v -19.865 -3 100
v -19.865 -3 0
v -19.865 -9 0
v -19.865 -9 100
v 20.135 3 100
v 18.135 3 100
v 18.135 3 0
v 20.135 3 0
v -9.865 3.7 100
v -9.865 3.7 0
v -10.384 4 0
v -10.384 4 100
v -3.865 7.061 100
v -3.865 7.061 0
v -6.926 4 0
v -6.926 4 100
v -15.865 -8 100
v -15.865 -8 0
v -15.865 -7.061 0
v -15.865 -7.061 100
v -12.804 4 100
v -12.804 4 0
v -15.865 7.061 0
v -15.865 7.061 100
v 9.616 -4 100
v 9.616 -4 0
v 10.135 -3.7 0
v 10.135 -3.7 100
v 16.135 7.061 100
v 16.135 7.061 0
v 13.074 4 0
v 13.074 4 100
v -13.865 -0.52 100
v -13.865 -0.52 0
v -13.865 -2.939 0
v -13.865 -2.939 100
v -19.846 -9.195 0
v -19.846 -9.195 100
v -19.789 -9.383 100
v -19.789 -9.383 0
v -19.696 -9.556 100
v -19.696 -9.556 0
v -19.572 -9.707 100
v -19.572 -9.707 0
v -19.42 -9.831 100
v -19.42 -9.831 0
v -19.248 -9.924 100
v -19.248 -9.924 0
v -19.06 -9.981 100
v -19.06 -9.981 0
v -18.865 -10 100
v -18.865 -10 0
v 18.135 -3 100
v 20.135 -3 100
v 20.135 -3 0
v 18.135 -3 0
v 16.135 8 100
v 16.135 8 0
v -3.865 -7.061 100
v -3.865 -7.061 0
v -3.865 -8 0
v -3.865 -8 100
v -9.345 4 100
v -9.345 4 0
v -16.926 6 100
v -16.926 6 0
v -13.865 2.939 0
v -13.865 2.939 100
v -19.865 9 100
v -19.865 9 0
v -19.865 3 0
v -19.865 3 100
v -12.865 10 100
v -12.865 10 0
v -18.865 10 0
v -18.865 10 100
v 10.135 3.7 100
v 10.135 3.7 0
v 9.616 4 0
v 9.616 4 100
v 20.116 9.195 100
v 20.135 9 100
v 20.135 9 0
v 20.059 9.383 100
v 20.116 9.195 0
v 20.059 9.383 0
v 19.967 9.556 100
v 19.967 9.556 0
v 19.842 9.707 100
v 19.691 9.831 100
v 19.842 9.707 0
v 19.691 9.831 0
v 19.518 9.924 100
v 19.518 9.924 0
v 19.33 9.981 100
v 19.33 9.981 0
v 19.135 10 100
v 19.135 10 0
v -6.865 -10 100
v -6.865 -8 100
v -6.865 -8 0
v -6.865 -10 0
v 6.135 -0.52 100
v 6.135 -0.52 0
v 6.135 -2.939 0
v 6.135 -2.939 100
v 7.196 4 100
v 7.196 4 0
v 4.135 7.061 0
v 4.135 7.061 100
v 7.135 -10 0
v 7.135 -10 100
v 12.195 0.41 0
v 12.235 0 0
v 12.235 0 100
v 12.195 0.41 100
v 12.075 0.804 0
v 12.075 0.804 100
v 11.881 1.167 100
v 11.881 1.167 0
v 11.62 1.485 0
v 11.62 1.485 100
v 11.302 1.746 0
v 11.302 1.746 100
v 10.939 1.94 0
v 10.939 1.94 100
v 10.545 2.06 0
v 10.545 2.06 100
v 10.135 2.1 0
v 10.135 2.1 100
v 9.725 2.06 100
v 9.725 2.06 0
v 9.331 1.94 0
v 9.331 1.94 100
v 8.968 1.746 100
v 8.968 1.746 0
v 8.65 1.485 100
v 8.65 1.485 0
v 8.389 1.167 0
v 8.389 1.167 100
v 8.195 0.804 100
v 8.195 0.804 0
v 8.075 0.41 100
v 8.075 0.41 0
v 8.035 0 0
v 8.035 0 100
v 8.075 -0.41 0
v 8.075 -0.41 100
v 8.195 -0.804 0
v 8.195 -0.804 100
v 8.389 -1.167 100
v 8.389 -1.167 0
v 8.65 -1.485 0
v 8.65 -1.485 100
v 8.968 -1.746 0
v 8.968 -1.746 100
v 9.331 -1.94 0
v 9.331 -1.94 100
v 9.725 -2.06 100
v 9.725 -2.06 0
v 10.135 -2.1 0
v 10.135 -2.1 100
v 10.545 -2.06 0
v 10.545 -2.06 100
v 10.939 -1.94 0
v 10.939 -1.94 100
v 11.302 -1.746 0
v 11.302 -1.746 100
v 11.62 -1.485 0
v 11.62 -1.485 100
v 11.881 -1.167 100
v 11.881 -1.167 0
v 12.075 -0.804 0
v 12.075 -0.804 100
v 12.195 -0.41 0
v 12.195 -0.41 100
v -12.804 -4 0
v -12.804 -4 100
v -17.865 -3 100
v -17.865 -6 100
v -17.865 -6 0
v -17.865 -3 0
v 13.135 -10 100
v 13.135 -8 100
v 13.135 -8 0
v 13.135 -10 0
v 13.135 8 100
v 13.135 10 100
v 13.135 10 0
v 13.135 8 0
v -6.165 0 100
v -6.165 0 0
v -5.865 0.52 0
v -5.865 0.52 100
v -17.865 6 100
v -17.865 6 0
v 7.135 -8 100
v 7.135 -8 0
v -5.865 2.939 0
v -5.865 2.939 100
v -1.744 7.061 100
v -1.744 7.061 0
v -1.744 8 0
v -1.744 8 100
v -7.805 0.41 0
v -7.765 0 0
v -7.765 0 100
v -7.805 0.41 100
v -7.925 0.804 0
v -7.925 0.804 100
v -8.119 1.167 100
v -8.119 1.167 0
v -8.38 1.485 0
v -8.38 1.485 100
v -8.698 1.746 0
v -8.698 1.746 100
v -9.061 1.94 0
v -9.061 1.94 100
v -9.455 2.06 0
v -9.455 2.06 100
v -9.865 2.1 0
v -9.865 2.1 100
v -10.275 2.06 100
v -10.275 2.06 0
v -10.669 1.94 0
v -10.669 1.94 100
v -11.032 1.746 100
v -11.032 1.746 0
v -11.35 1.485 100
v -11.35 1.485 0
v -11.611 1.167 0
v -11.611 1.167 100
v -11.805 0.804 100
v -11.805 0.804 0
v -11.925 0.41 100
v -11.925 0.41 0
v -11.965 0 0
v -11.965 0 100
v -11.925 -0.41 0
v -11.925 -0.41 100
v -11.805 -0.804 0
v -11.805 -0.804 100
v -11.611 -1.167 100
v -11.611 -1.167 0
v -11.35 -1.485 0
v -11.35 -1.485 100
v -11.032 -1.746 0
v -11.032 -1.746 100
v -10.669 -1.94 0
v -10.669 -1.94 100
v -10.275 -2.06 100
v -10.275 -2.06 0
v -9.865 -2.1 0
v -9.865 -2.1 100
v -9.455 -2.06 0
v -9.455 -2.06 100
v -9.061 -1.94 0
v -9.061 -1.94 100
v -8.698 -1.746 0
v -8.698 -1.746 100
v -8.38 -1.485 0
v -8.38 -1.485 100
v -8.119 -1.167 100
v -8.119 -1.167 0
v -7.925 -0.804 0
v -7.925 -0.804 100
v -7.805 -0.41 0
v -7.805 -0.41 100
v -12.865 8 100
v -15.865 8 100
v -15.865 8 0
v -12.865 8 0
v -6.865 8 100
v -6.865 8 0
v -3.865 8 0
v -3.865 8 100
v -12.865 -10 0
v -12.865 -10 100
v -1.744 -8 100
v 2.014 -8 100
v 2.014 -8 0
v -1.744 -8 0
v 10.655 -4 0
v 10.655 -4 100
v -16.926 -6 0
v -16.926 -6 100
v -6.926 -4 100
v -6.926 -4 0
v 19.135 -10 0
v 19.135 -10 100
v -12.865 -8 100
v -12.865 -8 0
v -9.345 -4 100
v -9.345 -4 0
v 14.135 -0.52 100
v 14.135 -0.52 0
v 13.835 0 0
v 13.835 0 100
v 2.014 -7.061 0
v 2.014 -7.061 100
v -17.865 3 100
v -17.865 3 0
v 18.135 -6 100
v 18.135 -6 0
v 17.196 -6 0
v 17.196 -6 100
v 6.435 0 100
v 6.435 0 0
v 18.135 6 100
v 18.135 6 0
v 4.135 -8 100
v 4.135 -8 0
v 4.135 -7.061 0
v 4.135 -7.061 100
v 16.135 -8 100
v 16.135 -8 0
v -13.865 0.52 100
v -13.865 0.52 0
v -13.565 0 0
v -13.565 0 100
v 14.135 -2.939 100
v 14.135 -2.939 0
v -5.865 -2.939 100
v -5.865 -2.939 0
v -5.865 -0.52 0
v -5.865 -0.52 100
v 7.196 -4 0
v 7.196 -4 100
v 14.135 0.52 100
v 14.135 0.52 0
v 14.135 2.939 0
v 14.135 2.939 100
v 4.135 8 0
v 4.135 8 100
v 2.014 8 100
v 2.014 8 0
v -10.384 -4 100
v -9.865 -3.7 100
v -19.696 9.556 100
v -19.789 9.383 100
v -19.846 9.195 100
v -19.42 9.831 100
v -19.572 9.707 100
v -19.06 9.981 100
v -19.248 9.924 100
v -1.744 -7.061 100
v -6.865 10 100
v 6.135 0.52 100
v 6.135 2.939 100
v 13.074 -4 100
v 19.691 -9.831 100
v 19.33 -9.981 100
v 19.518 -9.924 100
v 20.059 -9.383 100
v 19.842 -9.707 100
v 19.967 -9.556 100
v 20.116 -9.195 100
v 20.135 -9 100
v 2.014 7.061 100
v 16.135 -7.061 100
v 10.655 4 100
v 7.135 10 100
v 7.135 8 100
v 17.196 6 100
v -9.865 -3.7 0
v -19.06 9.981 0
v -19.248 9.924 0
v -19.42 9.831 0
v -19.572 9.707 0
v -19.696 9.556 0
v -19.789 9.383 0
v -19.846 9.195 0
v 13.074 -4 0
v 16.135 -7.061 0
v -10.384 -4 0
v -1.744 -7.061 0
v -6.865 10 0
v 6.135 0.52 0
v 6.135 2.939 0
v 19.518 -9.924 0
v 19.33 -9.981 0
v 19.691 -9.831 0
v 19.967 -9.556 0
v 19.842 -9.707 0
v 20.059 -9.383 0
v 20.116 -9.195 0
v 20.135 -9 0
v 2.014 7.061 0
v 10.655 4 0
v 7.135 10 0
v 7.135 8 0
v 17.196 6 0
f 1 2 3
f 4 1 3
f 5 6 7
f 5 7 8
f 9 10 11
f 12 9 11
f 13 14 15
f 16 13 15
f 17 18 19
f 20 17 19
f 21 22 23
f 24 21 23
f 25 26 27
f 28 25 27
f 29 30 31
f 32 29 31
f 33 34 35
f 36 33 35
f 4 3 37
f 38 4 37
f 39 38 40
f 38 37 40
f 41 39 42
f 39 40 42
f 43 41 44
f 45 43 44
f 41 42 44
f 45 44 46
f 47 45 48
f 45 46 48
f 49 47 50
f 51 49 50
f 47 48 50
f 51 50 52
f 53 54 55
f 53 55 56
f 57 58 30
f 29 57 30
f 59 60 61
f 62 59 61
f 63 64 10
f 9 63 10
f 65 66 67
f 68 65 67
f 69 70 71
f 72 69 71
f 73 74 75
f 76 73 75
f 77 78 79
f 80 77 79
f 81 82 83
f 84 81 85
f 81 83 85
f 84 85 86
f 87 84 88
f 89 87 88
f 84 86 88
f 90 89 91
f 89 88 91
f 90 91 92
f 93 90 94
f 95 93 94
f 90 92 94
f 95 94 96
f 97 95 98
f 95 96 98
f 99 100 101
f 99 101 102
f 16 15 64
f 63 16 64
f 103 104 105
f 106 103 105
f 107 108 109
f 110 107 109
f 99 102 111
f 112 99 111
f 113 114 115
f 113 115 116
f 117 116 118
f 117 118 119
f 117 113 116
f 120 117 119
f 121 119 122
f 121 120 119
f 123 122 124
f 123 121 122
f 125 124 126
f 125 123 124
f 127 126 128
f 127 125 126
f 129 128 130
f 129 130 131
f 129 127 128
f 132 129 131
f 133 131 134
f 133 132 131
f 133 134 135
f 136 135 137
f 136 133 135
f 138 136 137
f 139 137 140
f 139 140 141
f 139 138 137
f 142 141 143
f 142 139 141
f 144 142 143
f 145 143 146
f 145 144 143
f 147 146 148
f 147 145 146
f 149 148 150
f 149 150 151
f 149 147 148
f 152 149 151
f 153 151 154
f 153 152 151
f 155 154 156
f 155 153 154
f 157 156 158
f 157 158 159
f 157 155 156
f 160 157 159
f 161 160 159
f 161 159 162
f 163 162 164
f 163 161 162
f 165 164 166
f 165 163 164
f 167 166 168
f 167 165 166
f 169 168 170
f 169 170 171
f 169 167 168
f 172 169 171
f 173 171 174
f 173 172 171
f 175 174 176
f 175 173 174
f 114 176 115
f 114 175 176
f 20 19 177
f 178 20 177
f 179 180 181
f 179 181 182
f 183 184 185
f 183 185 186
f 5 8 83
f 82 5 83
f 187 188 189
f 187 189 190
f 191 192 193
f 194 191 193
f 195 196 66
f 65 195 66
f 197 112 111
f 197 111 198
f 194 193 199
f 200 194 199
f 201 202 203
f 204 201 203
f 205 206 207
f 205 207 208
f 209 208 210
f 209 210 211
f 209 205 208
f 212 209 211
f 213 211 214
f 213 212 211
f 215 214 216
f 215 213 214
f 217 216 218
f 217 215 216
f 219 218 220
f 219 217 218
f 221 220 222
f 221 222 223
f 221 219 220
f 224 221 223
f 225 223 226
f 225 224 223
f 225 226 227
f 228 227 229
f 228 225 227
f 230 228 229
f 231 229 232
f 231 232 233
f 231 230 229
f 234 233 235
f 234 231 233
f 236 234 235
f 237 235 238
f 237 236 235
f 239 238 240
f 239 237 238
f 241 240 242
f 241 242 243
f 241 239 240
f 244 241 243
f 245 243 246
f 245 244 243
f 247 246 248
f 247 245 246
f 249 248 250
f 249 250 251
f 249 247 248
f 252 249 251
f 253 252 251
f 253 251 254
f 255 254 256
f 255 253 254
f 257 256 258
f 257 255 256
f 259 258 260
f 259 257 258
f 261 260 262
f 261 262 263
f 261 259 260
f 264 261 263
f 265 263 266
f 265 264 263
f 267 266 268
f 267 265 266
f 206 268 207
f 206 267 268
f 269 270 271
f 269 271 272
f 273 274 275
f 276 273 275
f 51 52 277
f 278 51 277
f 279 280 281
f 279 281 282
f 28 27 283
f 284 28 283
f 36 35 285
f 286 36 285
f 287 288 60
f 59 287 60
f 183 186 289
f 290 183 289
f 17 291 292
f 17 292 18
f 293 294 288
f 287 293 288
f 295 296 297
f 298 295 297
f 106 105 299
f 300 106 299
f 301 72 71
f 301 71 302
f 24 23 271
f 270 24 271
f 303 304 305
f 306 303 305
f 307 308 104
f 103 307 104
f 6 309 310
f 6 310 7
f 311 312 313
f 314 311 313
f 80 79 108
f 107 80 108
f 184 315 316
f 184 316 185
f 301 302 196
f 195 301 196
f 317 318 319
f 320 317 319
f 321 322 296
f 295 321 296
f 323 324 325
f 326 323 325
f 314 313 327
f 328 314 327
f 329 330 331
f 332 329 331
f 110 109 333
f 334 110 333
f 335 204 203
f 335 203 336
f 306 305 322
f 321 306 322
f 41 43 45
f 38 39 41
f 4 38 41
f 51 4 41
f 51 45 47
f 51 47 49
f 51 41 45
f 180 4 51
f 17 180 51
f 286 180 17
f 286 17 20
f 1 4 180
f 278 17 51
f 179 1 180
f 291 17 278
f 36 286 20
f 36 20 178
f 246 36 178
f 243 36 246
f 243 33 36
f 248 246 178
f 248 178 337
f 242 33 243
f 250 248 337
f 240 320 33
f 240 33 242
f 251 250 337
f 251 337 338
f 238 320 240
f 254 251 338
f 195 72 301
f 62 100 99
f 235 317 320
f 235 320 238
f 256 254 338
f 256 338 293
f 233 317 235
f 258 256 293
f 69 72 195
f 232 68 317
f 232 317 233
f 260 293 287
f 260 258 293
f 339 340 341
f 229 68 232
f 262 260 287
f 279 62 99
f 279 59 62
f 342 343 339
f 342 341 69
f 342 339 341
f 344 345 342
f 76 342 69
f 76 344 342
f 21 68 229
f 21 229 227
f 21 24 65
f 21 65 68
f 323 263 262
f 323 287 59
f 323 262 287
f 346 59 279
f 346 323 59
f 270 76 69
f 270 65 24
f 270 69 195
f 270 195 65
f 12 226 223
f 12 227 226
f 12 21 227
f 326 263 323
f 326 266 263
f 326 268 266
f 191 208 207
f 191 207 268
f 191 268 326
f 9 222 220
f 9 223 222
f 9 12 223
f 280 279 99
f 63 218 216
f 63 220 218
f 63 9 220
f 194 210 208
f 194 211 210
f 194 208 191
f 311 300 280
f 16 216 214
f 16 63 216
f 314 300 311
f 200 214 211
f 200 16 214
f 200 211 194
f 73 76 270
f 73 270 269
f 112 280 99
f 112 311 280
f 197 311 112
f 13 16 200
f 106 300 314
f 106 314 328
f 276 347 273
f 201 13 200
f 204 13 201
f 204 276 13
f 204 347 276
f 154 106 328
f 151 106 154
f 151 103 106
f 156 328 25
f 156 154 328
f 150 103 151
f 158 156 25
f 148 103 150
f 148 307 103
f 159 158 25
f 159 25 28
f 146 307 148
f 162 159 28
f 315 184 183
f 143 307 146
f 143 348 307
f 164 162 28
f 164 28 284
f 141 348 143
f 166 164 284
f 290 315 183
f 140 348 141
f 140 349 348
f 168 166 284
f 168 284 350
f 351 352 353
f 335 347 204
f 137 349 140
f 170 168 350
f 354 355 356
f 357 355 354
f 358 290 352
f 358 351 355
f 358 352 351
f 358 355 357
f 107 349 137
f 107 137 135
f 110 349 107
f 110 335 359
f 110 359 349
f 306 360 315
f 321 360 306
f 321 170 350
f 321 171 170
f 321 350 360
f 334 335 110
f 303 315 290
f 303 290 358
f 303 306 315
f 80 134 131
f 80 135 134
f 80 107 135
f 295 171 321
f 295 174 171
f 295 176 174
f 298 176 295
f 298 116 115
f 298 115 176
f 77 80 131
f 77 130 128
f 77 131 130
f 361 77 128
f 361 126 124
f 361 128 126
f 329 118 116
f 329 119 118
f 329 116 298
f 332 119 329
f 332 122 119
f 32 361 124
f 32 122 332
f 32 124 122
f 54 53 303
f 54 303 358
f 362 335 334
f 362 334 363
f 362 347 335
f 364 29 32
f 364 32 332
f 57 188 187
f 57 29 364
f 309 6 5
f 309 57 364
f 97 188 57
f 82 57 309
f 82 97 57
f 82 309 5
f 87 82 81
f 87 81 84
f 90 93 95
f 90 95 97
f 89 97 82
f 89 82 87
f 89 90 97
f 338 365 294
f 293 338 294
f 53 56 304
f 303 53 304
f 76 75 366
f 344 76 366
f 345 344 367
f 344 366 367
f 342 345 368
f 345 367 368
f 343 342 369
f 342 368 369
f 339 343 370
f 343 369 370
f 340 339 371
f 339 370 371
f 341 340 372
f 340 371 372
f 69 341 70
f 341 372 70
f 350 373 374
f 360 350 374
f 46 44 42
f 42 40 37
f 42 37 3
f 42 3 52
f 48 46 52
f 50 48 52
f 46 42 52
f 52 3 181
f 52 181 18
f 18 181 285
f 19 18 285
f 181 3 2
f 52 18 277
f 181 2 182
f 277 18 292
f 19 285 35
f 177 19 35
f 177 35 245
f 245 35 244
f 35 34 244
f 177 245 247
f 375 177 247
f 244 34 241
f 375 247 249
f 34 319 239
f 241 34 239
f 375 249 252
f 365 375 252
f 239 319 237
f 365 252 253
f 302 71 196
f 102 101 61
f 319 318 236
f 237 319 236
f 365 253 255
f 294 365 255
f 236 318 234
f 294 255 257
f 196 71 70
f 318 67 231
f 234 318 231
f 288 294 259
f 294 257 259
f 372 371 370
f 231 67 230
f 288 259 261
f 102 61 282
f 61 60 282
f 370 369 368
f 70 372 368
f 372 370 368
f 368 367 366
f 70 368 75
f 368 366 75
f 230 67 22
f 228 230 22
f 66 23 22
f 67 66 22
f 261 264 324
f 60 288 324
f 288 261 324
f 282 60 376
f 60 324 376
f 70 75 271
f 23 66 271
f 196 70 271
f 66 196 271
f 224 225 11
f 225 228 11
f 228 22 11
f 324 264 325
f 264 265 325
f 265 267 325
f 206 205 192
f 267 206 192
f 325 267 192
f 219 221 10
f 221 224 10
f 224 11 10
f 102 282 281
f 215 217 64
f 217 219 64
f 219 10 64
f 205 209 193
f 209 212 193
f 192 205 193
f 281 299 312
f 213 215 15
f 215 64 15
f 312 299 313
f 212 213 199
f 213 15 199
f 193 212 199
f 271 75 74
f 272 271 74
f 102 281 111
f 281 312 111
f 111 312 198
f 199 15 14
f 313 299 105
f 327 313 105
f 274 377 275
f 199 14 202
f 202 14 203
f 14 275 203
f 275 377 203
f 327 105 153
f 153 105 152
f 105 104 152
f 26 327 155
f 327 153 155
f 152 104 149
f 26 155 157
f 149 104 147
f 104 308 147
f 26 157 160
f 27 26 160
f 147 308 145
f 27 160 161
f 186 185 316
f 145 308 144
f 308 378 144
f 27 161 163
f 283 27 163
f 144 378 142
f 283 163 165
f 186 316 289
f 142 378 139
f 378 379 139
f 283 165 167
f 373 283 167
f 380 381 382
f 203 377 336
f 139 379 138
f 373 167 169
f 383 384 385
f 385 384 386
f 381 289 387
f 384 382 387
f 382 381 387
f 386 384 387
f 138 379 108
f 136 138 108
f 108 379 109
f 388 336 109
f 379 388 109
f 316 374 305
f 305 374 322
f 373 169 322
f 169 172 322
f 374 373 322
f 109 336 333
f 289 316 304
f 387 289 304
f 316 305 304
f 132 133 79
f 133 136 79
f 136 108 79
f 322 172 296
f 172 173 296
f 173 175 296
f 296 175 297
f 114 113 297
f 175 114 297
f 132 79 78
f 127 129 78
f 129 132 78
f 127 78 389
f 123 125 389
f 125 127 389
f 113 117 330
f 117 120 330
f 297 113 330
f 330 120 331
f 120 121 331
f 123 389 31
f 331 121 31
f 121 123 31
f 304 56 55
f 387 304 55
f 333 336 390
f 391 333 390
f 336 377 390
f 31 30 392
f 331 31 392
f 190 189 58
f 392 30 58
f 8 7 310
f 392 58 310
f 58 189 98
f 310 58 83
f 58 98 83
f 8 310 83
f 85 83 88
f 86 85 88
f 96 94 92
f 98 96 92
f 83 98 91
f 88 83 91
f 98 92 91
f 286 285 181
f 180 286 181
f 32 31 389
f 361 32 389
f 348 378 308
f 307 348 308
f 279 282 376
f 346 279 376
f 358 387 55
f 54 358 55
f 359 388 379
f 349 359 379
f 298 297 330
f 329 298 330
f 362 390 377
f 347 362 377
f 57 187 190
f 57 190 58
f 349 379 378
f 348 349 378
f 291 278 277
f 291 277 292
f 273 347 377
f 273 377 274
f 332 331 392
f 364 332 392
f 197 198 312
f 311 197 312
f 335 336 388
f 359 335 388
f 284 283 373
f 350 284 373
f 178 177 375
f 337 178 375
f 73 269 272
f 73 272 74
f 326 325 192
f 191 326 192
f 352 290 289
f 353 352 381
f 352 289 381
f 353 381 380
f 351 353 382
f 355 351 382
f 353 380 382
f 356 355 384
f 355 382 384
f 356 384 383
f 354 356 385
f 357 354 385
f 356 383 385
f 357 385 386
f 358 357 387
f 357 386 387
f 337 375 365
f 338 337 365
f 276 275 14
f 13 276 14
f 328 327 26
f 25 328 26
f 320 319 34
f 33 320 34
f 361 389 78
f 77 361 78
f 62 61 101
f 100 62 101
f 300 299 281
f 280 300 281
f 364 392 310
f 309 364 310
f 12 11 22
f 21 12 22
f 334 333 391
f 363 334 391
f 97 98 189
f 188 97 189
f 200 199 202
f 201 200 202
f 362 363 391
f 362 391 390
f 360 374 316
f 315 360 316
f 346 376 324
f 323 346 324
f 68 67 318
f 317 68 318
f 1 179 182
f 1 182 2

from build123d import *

# Parameters (mm, degrees)
F0_R     = 2.1
F1_DEPTH = 100


with BuildPart() as f1:
    # F0 (on Top) → F1 (new body)
    with BuildSketch(Plane.XY):
        with BuildLine():
            Line((14.135135, -0.519615), (13.835135, 0))
            Line((13.835135, 0), (14.135135, 0.519615))
            Line((14.135135, 0.519615), (14.135135, 2.93934))
            Line((14.135135, 2.93934), (17.195795, 6))
            Line((17.195795, 6), (18.135135, 6))
            Line((18.135135, 6), (18.135135, 3))
            Line((18.135135, 3), (20.135135, 3))
            Line((20.135135, 3), (20.135135, 9))
            ThreePointArc((20.135135, 9), (19.842242, 9.707107), (19.135135, 10))
            Line((19.135135, 10), (13.135135, 10))
            Line((13.135135, 10), (13.135135, 8))
            Line((13.135135, 8), (16.135135, 8))
            Line((16.135135, 8), (16.135135, 7.06066))
            Line((16.135135, 7.06066), (13.074475, 4))
            Line((13.074475, 4), (10.65475, 4))
            Line((10.65475, 4), (10.135135, 3.7))
            Line((10.135135, 3.7), (9.61552, 4))
            Line((9.61552, 4), (7.195795, 4))
            Line((7.195795, 4), (4.135135, 7.06066))
            Line((4.135135, 7.06066), (4.135135, 8))
            Line((4.135135, 8), (7.135135, 8))
            Line((7.135135, 8), (7.135135, 10))
            Line((7.135135, 10), (-6.864865, 10))
            Line((-6.864865, 10), (-6.864865, 8))
            Line((-6.864865, 8), (-3.864865, 8))
            Line((-3.864865, 8), (-3.864865, 7.06066))
            Line((-3.864865, 7.06066), (-6.925525, 4))
            Line((-6.925525, 4), (-9.34525, 4))
            Line((-9.34525, 4), (-9.864865, 3.7))
            Line((-9.864865, 3.7), (-10.38448, 4))
            Line((-10.38448, 4), (-12.804205, 4))
            Line((-12.804205, 4), (-15.864865, 7.06066))
            Line((-15.864865, 7.06066), (-15.864865, 8))
            Line((-15.864865, 8), (-12.864865, 8))
            Line((-12.864865, 8), (-12.864865, 10))
            Line((-12.864865, 10), (-18.864865, 10))
            ThreePointArc((-18.864865, 10), (-19.571972, 9.707107), (-19.864865, 9))
            Line((-19.864865, 9), (-19.864865, 3))
            Line((-19.864865, 3), (-17.864865, 3))
            Line((-17.864865, 3), (-17.864865, 6))
            Line((-17.864865, 6), (-16.925525, 6))
            Line((-16.925525, 6), (-13.864865, 2.93934))
            Line((-13.864865, 2.93934), (-13.864865, 0.519615))
            Line((-13.864865, 0.519615), (-13.564865, 0))
            Line((-13.564865, 0), (-13.864865, -0.519615))
            Line((-13.864865, -0.519615), (-13.864865, -2.93934))
            Line((-13.864865, -2.93934), (-16.925525, -6))
            Line((-16.925525, -6), (-17.864865, -6))
            Line((-17.864865, -6), (-17.864865, -3))
            Line((-17.864865, -3), (-19.864865, -3))
            Line((-19.864865, -3), (-19.864865, -9))
            ThreePointArc((-19.864865, -9), (-19.571972, -9.707107), (-18.864865, -10))
            Line((-18.864865, -10), (-12.864865, -10))
            Line((-12.864865, -10), (-12.864865, -8))
            Line((-12.864865, -8), (-15.864865, -8))
            Line((-15.864865, -8), (-15.864865, -7.06066))
            Line((-15.864865, -7.06066), (-12.804205, -4))
            Line((-12.804205, -4), (-10.38448, -4))
            Line((-10.38448, -4), (-9.864865, -3.7))
            Line((-9.864865, -3.7), (-9.34525, -4))
            Line((-9.34525, -4), (-6.925525, -4))
            Line((-6.925525, -4), (-3.864865, -7.06066))
            Line((-3.864865, -7.06066), (-3.864865, -8))
            Line((-3.864865, -8), (-6.864865, -8))
            Line((-6.864865, -8), (-6.864865, -10))
            Line((-6.864865, -10), (7.135135, -10))
            Line((7.135135, -10), (7.135135, -8))
            Line((7.135135, -8), (4.135135, -8))
            Line((4.135135, -8), (4.135135, -7.06066))
            Line((4.135135, -7.06066), (7.195795, -4))
            Line((7.195795, -4), (9.61552, -4))
            Line((9.61552, -4), (10.135135, -3.7))
            Line((10.135135, -3.7), (10.65475, -4))
            Line((10.65475, -4), (13.074475, -4))
            Line((13.074475, -4), (16.135135, -7.06066))
            Line((16.135135, -7.06066), (16.135135, -8))
            Line((16.135135, -8), (13.135135, -8))
            Line((13.135135, -8), (13.135135, -10))
            Line((13.135135, -10), (19.135135, -10))
            ThreePointArc((19.135135, -10), (19.842242, -9.707107), (20.135135, -9))
            Line((20.135135, -9), (20.135135, -3))
            Line((20.135135, -3), (18.135135, -3))
            Line((18.135135, -3), (18.135135, -6))
            Line((18.135135, -6), (17.195795, -6))
            Line((17.195795, -6), (14.135135, -2.93934))
            Line((14.135135, -2.93934), (14.135135, -0.519615))
        make_face()
        with Locations((-9.864865, 0)):
            Circle(F0_R, mode=Mode.SUBTRACT)
        Polygon((6.435135, 0), (6.135135, -0.519615), (6.135135, -2.93934), (3.074475, -6), (2.013815, -7.06066), (2.013815, -8), (-1.743545, -8), (-1.743545, -7.06066), (-2.804205, -6), (-5.864865, -2.93934), (-5.864865, -0.519615), (-6.164865, 0), (-5.864865, 0.519615), (-5.864865, 2.93934), (-2.804205, 6), (-1.743545, 7.06066), (-1.743545, 8), (2.013815, 8), (2.013815, 7.06066), (3.074475, 6), (6.135135, 2.93934), (6.135135, 0.519615), align=None, mode=Mode.SUBTRACT)
        with Locations((10.135135, 0)):
            Circle(F0_R, mode=Mode.SUBTRACT)
    extrude(amount=F1_DEPTH)


solid = f1.part
